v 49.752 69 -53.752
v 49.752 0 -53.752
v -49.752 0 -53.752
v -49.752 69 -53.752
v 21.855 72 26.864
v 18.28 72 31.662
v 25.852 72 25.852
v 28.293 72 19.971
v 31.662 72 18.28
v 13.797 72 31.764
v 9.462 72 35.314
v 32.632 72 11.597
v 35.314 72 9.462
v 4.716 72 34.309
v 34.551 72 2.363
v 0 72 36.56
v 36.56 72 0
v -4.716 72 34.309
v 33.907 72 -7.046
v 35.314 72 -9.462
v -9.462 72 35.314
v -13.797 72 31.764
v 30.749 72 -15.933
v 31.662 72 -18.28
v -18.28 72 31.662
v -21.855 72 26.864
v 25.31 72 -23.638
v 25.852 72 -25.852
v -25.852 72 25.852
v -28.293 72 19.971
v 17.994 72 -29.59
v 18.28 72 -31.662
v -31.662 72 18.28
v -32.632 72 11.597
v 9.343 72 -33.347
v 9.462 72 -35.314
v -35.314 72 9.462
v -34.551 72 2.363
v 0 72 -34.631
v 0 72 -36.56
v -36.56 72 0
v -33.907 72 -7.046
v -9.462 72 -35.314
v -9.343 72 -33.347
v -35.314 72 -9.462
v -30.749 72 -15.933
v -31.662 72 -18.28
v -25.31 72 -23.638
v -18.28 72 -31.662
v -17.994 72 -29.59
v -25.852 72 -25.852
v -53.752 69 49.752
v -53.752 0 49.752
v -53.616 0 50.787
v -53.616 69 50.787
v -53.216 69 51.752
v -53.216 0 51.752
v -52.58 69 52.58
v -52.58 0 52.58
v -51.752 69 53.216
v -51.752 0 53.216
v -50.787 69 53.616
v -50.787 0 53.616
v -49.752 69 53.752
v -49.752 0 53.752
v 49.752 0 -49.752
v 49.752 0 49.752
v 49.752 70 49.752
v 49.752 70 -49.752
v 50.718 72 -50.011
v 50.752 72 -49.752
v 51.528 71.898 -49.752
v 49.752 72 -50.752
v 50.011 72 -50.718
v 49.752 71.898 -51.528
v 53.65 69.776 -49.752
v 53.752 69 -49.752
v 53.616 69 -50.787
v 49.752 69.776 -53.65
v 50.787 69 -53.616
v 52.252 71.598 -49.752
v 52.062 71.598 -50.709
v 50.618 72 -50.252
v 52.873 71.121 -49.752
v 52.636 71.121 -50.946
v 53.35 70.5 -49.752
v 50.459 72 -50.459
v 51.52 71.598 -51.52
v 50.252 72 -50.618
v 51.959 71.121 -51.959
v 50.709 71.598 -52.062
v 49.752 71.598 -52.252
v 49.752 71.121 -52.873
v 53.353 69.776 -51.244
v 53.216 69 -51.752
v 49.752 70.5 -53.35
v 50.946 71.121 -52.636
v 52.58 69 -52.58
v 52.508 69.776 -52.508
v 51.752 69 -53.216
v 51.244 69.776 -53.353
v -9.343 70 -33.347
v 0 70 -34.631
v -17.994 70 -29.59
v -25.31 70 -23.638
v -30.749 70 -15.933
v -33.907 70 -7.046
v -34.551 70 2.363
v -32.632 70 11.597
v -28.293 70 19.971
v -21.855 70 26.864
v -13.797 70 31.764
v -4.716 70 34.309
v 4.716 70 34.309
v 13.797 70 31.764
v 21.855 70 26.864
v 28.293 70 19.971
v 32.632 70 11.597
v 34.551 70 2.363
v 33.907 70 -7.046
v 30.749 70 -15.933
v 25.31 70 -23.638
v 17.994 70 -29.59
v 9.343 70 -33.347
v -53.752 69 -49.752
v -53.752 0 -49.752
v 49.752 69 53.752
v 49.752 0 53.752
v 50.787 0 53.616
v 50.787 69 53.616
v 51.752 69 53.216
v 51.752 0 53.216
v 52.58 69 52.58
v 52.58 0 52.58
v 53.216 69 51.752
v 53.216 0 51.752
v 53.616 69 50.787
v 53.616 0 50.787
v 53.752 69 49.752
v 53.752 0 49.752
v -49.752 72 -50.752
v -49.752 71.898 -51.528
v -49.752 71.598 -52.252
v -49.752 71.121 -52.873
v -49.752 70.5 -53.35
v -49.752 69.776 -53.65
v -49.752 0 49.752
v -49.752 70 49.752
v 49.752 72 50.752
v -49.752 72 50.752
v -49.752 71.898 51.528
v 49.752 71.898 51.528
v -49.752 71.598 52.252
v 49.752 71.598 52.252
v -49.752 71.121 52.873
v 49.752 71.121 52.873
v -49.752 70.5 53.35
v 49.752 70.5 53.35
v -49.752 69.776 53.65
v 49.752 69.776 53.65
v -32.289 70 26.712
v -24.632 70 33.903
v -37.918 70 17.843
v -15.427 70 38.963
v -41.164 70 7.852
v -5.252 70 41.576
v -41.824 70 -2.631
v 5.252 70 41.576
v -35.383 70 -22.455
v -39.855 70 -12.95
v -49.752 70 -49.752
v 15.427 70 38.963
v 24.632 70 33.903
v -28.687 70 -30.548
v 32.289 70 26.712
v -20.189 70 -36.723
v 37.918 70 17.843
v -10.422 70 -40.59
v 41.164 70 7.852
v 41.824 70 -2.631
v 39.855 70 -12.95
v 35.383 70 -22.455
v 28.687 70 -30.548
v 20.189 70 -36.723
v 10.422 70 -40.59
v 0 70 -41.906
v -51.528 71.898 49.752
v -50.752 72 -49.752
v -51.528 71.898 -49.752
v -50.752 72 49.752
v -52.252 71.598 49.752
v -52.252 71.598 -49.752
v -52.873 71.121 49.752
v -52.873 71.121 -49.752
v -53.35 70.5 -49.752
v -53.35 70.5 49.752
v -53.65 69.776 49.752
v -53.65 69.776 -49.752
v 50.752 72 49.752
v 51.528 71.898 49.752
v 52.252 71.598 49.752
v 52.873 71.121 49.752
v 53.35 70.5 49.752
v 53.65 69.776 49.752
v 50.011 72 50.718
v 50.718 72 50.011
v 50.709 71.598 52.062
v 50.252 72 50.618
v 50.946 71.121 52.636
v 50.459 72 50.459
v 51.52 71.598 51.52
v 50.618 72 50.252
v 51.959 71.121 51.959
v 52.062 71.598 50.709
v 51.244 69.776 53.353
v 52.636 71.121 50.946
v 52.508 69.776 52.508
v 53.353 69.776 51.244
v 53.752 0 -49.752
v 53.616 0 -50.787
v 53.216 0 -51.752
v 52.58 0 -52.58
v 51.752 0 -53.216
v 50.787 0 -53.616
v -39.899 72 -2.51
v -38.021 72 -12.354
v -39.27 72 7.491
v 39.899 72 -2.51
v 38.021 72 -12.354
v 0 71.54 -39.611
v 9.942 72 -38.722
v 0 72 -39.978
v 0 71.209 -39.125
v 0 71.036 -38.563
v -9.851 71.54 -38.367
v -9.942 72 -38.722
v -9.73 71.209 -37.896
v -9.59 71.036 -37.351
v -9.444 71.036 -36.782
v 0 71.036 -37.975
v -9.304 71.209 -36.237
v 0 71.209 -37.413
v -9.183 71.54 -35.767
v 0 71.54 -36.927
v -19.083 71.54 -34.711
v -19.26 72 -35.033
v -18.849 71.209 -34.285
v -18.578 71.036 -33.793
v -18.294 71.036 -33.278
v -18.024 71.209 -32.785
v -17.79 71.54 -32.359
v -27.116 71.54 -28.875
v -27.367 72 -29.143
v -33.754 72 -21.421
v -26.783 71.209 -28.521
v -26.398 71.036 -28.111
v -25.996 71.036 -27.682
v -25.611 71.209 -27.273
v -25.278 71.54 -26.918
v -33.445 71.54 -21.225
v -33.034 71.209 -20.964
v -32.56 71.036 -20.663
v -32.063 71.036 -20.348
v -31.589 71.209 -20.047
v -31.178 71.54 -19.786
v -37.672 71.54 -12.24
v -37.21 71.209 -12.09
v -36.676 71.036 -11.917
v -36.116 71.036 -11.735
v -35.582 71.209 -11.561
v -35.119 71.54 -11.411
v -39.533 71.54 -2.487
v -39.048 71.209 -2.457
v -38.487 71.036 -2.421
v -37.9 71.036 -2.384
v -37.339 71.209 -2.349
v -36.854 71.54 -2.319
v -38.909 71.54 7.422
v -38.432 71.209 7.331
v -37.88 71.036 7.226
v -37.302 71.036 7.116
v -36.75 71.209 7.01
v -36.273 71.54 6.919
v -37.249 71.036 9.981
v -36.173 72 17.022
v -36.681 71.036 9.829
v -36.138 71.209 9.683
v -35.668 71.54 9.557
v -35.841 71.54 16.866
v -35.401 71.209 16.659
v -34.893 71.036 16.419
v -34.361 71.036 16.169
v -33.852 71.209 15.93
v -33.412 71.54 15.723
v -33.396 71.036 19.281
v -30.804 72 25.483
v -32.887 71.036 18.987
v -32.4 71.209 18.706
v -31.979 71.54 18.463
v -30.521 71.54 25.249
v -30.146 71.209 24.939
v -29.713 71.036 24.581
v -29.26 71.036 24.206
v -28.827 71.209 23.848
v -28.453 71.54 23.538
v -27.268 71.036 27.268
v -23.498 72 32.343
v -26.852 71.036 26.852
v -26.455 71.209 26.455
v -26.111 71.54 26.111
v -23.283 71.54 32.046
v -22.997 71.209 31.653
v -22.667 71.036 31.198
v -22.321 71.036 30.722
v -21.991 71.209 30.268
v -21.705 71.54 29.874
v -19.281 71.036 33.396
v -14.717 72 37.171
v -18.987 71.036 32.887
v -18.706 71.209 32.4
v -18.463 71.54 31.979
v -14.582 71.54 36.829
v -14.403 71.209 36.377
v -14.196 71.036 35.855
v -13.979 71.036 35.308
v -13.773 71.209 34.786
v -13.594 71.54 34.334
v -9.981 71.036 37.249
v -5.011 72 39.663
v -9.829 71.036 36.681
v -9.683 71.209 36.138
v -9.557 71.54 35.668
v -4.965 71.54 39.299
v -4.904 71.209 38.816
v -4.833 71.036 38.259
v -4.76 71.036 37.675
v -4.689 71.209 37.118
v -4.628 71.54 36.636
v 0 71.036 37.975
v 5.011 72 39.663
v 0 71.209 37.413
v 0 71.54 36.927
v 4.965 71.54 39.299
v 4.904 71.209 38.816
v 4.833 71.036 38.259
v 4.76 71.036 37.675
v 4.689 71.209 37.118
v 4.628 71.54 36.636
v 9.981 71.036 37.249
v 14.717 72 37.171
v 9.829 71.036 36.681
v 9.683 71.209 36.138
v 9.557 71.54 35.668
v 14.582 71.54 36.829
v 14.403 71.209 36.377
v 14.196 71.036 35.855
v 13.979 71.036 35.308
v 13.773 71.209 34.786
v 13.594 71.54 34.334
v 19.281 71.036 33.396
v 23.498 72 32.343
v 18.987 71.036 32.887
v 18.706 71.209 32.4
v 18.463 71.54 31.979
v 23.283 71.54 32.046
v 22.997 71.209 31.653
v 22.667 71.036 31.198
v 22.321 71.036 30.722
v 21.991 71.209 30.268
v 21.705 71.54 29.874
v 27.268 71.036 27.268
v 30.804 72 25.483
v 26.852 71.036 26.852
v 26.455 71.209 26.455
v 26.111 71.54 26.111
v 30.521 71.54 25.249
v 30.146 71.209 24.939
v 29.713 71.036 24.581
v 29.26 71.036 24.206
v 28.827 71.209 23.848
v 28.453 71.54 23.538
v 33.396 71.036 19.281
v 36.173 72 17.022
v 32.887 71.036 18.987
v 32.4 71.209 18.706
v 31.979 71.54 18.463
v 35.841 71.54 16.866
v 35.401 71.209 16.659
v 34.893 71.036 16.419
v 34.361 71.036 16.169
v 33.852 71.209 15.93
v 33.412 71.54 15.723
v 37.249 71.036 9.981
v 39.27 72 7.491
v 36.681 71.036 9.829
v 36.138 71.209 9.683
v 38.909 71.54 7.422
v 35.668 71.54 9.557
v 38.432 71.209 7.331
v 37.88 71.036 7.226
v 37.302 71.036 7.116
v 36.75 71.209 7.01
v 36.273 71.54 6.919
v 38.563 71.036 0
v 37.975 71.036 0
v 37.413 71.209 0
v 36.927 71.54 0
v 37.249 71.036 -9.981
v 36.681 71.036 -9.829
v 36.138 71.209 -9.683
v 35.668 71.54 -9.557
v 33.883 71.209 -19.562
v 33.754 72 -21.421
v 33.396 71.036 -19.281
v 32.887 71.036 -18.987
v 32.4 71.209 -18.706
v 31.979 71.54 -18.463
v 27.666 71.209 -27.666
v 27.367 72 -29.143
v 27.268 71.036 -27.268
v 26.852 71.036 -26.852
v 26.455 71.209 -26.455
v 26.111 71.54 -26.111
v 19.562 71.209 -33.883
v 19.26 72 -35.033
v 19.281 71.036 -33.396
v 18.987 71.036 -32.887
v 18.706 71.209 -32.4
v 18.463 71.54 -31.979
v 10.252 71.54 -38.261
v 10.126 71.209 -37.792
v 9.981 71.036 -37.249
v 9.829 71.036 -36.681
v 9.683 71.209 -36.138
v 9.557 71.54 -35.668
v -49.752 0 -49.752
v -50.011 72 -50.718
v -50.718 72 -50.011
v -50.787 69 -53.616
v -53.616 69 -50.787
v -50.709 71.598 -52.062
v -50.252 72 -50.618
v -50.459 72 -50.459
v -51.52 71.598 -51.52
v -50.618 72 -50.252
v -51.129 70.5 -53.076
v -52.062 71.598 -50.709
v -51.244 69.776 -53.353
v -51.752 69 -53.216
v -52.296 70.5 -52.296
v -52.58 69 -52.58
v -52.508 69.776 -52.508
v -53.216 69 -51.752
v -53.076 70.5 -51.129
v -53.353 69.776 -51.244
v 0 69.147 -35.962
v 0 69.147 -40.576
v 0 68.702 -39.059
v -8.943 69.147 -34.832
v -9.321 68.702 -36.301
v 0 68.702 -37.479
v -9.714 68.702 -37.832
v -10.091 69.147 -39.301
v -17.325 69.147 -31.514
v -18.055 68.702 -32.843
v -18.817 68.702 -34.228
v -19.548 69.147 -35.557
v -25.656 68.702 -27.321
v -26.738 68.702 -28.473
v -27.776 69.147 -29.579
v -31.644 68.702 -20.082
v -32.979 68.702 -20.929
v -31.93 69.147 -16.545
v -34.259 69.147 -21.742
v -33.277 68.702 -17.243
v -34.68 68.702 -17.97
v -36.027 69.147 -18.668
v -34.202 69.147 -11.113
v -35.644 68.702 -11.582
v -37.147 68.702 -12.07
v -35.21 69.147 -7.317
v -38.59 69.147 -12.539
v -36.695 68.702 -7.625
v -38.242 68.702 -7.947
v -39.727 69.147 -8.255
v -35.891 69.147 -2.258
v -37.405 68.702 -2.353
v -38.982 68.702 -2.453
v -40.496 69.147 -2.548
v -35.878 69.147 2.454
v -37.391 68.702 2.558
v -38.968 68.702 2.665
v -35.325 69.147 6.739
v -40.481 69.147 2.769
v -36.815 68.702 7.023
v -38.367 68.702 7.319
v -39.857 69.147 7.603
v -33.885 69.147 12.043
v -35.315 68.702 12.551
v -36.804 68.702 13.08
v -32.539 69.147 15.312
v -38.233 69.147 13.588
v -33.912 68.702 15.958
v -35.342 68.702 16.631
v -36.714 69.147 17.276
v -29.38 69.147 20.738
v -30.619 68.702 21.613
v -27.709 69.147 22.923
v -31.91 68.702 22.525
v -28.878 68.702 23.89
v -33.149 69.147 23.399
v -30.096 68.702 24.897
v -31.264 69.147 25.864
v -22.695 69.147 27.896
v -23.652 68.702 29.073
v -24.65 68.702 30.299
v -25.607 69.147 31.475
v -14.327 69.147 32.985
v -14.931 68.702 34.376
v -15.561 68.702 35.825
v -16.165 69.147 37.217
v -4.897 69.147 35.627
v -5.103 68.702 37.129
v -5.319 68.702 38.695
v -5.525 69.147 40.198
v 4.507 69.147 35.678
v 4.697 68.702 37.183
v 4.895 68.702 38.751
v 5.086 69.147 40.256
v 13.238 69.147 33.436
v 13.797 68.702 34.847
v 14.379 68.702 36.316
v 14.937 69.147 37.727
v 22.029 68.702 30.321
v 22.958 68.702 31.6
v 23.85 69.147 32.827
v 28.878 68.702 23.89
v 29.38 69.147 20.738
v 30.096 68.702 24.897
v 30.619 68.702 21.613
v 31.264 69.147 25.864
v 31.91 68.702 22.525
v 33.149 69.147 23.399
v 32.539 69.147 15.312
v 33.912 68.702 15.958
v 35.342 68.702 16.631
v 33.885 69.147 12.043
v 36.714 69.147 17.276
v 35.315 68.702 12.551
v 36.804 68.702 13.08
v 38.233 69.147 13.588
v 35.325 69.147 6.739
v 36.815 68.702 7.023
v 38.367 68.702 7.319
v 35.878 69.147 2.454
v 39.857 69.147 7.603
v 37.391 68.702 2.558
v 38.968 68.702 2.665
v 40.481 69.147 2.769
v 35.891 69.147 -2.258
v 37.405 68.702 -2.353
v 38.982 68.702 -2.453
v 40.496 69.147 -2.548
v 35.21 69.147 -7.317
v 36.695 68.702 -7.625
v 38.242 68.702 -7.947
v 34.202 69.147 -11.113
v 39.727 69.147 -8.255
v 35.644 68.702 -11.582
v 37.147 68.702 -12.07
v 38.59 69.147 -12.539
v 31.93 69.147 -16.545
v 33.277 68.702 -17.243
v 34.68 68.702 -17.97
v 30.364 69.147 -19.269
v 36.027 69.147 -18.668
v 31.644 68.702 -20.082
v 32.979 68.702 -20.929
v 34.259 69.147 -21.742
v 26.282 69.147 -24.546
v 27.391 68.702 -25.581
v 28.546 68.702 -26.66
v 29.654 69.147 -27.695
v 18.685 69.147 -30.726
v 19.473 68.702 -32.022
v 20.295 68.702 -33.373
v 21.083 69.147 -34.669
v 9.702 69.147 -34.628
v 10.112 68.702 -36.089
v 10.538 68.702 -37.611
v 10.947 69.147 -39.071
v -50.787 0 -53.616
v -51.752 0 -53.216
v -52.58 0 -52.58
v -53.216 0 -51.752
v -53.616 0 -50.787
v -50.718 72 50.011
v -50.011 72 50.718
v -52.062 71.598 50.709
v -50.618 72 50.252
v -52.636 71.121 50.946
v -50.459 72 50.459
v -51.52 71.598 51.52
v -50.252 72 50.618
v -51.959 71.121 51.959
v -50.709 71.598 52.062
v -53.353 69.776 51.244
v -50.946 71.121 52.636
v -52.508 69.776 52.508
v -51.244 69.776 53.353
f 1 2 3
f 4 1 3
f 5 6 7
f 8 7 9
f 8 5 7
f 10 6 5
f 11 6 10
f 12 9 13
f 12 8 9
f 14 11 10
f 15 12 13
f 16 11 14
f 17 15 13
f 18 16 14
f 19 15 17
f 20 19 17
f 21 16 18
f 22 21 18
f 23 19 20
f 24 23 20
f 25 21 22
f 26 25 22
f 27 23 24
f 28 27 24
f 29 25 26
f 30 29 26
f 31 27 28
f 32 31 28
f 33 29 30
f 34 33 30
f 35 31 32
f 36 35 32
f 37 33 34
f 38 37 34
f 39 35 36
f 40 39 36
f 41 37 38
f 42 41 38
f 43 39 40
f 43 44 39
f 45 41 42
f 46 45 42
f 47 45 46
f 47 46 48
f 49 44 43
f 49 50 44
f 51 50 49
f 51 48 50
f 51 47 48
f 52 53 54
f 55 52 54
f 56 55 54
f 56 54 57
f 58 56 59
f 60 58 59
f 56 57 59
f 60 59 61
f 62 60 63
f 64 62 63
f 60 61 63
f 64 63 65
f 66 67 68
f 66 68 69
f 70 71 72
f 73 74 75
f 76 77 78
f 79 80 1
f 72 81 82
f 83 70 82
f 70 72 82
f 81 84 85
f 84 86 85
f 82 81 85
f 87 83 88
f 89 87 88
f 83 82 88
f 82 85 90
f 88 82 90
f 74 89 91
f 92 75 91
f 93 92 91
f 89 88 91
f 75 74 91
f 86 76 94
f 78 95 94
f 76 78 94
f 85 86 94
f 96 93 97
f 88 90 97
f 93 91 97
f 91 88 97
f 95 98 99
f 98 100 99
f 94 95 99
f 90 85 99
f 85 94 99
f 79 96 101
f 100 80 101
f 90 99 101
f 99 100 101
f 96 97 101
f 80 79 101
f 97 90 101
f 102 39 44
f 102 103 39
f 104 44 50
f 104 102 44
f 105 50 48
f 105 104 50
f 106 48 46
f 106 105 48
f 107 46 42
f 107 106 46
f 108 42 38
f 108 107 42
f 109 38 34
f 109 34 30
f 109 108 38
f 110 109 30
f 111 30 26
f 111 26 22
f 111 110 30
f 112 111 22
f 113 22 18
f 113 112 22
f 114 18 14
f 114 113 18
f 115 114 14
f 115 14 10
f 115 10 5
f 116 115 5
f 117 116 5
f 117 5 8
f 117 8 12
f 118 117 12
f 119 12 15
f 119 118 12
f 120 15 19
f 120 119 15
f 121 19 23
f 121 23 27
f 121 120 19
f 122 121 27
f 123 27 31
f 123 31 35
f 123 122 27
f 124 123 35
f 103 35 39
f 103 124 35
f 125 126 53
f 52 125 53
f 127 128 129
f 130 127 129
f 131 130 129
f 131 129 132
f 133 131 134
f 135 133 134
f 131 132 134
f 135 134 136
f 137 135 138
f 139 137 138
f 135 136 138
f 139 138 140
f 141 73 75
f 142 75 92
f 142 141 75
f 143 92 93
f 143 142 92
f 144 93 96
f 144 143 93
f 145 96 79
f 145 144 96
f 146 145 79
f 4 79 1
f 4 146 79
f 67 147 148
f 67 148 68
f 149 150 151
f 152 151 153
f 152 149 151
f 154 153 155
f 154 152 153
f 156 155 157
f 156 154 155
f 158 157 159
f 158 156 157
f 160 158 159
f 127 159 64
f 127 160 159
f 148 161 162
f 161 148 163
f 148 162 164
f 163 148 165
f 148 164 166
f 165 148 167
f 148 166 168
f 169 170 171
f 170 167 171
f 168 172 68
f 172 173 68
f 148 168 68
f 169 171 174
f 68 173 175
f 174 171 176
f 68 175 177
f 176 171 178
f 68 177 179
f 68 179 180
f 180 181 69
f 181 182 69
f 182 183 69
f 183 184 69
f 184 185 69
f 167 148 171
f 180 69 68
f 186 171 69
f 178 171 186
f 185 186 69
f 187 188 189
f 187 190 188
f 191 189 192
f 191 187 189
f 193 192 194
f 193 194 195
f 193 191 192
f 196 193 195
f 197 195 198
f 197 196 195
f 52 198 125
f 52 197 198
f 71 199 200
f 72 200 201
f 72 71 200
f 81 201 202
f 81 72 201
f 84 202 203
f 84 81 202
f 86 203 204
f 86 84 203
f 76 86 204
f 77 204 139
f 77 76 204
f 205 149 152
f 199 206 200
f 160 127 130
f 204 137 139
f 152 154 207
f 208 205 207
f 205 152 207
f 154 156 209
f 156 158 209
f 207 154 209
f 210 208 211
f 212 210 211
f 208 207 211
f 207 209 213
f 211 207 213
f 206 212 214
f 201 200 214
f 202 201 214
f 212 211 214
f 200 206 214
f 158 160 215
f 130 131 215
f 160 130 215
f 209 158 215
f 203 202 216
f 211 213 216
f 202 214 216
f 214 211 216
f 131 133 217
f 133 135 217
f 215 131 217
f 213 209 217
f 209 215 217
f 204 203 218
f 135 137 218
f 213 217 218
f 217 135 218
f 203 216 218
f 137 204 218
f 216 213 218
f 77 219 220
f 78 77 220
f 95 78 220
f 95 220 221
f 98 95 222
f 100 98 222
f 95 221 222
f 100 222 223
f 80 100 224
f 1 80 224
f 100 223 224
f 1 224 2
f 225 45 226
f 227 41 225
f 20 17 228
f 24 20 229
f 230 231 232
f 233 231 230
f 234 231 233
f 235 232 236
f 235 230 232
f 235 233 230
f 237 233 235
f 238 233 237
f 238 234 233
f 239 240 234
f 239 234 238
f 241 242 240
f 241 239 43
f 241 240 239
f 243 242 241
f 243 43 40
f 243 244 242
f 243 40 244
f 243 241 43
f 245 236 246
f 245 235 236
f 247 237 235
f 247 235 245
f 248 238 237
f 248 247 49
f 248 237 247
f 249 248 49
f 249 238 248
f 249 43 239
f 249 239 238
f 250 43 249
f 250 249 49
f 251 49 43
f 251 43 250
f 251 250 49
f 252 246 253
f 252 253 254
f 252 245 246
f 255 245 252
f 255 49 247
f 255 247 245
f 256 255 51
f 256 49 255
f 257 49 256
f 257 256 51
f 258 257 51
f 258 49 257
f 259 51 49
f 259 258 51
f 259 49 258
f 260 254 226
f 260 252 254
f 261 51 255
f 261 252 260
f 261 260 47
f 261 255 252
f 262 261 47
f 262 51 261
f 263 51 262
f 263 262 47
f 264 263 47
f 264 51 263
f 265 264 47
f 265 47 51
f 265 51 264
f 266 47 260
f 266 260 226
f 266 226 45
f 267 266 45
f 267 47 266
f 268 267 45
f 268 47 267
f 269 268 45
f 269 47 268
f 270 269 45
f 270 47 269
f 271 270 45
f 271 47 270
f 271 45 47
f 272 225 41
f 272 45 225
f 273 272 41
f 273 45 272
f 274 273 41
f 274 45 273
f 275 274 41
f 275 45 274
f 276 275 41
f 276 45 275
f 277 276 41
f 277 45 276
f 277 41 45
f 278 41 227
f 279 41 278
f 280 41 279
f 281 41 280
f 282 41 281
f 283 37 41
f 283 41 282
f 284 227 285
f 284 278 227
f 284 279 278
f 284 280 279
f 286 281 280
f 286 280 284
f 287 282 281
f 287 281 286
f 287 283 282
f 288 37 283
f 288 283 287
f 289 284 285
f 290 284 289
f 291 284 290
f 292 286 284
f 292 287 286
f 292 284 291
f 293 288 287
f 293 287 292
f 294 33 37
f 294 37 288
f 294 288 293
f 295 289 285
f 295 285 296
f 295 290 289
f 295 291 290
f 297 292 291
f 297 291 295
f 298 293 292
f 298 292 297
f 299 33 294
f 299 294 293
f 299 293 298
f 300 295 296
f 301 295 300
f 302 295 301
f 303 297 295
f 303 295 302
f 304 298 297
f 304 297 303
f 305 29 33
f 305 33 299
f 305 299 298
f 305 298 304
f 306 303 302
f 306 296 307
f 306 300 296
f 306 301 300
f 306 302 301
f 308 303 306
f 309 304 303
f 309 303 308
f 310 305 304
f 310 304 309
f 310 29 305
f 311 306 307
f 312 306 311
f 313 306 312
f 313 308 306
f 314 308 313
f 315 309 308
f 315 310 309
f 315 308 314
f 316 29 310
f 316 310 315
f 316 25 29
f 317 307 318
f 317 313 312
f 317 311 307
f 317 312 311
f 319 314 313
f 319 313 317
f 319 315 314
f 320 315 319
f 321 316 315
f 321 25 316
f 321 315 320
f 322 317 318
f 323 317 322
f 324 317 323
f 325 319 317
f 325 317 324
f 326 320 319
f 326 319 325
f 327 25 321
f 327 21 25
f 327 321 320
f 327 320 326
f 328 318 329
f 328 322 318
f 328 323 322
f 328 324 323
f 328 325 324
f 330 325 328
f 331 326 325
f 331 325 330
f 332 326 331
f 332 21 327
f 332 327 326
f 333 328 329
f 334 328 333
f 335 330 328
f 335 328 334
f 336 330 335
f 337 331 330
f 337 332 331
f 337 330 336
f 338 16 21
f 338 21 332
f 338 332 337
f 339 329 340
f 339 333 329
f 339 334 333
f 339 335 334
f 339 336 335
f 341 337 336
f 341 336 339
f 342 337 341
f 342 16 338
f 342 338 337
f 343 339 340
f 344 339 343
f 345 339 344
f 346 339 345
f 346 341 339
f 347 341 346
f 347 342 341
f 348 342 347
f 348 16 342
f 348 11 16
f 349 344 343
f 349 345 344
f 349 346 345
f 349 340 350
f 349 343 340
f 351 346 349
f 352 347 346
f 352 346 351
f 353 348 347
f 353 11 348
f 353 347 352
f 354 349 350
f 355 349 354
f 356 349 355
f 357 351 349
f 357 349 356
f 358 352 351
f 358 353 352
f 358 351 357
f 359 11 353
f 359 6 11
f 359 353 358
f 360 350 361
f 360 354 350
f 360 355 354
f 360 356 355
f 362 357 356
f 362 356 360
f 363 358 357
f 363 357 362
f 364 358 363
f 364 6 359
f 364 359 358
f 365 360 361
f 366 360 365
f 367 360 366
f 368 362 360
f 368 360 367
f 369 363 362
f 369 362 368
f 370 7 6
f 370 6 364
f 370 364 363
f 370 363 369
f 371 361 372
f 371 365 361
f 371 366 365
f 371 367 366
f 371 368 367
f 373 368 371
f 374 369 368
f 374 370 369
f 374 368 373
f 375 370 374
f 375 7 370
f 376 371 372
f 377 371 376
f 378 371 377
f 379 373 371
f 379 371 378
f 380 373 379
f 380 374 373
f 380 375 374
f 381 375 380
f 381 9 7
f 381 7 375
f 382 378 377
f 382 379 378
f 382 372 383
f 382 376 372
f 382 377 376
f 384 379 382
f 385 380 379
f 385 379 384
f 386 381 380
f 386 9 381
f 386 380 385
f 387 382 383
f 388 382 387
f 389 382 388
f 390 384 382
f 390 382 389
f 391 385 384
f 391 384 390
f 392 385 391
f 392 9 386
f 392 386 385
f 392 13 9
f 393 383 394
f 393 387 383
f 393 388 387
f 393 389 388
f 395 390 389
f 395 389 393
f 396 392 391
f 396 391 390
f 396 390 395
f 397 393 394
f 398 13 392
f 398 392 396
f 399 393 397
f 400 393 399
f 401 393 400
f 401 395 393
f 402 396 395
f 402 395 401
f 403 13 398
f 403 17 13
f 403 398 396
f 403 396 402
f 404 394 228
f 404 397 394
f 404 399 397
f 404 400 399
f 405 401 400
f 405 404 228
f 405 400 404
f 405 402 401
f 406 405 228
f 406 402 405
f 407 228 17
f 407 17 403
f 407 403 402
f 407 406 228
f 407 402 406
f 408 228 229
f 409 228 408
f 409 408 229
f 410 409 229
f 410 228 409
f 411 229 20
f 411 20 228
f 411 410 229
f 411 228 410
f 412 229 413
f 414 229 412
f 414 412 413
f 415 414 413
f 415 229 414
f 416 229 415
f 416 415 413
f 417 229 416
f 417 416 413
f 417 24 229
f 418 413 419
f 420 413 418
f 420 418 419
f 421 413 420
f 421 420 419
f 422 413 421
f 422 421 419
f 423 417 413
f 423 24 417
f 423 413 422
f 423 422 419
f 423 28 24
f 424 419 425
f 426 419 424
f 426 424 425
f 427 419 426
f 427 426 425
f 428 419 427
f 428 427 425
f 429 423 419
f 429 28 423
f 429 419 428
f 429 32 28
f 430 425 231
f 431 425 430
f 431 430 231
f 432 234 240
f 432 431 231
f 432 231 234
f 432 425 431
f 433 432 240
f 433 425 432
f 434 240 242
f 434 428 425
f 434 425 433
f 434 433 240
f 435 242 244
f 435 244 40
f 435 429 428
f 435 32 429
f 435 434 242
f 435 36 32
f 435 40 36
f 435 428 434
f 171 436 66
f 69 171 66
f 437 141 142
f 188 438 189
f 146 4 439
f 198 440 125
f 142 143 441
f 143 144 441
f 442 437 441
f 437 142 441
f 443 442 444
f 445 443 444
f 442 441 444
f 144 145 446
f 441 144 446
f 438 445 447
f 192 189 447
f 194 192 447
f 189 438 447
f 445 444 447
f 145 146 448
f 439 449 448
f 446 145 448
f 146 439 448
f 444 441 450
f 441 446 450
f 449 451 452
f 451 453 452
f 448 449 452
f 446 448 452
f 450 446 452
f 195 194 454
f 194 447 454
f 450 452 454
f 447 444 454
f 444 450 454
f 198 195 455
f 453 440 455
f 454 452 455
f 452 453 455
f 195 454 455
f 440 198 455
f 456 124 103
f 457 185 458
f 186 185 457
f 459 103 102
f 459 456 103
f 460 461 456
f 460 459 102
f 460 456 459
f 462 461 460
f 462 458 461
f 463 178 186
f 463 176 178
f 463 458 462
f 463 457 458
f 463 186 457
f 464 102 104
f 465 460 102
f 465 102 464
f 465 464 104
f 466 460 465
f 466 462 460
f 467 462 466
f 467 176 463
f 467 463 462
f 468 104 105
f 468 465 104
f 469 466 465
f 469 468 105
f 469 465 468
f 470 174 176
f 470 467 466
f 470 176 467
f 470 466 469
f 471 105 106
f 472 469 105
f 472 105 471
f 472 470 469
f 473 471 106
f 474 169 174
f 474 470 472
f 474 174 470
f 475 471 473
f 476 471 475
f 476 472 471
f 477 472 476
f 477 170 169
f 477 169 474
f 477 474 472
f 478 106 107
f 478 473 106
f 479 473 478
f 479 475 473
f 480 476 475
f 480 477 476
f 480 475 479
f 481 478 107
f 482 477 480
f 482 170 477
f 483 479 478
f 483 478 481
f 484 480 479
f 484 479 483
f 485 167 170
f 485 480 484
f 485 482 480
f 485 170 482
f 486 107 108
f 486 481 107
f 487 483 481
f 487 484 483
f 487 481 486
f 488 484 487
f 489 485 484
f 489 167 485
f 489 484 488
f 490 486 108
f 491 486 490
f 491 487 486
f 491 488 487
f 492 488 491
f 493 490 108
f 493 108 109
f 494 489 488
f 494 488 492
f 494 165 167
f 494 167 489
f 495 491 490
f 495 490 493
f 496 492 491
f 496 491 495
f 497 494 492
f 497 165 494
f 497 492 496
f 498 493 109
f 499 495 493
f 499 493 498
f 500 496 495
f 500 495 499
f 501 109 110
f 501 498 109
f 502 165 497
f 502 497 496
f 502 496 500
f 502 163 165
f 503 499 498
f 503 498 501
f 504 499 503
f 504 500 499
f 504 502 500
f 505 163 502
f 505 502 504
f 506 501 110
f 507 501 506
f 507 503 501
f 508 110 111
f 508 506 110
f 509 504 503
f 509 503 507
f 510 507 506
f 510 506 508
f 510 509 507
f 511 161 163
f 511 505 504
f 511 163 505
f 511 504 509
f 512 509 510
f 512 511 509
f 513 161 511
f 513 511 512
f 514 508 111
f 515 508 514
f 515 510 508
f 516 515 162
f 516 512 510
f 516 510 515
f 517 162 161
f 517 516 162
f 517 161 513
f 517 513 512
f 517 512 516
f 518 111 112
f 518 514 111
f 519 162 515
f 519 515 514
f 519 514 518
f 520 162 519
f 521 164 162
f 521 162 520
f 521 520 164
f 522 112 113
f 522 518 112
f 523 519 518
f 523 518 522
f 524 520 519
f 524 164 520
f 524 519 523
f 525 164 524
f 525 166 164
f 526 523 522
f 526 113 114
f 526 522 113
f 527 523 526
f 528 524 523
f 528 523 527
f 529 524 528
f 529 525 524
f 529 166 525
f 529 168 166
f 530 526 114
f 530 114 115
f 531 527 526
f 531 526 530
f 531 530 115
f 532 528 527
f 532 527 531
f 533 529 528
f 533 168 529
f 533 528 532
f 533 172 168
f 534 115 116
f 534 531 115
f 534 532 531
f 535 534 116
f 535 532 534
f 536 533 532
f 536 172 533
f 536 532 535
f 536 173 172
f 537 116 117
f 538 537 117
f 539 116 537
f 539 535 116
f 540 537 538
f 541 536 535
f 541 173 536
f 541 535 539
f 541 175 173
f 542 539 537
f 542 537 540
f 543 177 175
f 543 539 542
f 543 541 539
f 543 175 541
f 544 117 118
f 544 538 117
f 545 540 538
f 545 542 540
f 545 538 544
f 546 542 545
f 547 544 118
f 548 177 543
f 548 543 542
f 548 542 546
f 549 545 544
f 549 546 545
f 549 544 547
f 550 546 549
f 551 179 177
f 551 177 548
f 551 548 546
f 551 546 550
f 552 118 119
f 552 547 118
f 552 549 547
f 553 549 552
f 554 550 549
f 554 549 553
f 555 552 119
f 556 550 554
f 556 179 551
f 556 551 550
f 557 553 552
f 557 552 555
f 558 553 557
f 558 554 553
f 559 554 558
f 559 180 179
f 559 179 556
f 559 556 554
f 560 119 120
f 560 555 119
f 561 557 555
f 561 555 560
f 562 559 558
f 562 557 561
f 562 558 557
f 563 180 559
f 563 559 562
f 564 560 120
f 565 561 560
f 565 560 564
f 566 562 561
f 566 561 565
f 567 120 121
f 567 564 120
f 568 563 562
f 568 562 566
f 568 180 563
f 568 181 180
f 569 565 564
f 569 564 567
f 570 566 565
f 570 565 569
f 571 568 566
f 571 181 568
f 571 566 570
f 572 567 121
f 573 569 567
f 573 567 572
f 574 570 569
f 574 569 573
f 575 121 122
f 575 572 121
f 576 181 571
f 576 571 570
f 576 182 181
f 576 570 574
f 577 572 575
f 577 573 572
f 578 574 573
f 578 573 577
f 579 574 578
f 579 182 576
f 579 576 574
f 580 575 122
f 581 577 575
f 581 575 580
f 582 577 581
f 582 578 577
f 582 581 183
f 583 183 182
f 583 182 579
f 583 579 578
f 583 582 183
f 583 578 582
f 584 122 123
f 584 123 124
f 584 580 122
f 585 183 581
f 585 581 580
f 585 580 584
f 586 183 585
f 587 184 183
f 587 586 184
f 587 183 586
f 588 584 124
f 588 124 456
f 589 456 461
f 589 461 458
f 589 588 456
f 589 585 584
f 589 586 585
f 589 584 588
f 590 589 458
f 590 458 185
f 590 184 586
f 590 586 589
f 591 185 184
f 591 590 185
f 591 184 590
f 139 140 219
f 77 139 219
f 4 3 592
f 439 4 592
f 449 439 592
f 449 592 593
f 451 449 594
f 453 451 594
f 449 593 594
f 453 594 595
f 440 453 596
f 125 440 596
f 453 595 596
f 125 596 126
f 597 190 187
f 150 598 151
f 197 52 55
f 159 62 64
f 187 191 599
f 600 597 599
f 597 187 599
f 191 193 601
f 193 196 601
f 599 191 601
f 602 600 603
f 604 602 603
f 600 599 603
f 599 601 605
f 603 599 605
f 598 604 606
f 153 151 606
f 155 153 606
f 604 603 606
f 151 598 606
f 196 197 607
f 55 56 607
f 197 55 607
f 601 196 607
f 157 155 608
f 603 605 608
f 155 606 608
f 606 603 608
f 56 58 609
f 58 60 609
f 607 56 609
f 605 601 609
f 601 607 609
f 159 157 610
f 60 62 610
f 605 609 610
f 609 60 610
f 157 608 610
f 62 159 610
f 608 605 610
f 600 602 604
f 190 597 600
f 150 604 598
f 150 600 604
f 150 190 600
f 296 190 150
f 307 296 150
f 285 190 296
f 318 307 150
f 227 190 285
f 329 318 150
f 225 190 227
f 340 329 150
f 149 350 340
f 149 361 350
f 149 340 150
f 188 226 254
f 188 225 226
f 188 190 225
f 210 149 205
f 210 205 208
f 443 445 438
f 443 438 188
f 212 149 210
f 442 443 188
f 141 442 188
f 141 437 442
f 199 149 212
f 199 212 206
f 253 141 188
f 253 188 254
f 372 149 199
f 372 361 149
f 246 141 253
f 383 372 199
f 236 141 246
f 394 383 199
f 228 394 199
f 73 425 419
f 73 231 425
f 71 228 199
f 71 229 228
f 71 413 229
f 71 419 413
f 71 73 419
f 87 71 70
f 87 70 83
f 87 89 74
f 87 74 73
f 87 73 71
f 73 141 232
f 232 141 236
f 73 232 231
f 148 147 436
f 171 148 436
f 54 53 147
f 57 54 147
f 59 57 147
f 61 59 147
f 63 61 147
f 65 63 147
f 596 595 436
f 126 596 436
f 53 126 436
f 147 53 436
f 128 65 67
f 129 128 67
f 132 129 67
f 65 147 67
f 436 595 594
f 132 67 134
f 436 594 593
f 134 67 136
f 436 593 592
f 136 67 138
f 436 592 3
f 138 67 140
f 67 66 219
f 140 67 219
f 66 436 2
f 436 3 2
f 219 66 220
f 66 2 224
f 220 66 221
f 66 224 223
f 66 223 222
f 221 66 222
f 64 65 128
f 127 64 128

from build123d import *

# Parameters (mm, degrees)
SKETCH1_W           = 99.503865414
SKETCH1_H           = 99.503865414
BOSS_EXTRUDE1_DEPTH = 70
SKETCH2_R           = 41.055084084
BOSS_EXTRUDE2_DEPTH = 2
FILLET1_R           = 3


with BuildPart() as part:
    # Sketch1 → Boss-Extrude1 (new body)
    with BuildSketch(Plane(origin=(0, 0, 0), x_dir=(1, 0, 0), z_dir=(0, 1, 0))):
        with BuildLine():
            Line((-49.751932707, -53.751932707), (49.751932707, -53.751932707))
            ThreePointArc((49.751932707, -53.751932707), (52.580359832, -52.580359832), (53.751932707, -49.751932707))
            Line((53.751932707, -49.751932707), (53.751932707, 49.751932707))
            ThreePointArc((53.751932707, 49.751932707), (52.580359832, 52.580359832), (49.751932707, 53.751932707))
            Line((49.751932707, 53.751932707), (-49.751932707, 53.751932707))
            ThreePointArc((-49.751932707, 53.751932707), (-52.580359832, 52.580359832), (-53.751932707, 49.751932707))
            Line((-53.751932707, 49.751932707), (-53.751932707, -49.751932707))
            ThreePointArc((-53.751932707, -49.751932707), (-52.580359832, -52.580359832), (-49.751932707, -53.751932707))
        make_face()
        Rectangle(SKETCH1_W, SKETCH1_H, mode=Mode.SUBTRACT)
    extrude(amount=BOSS_EXTRUDE1_DEPTH)

    # Sketch2 → Boss-Extrude2 (add)
    with BuildSketch(Plane(origin=(0, 70, 0), x_dir=(1, 0, 0), z_dir=(0, 1, 0))):
        with BuildLine():
            Line((-49.751932707, -53.751932707), (49.751932707, -53.751932707))
            ThreePointArc((49.751932707, -53.751932707), (52.580359832, -52.580359832), (53.751932707, -49.751932707))
            Line((53.751932707, -49.751932707), (53.751932707, 49.751932707))
            ThreePointArc((53.751932707, 49.751932707), (52.580359832, 52.580359832), (49.751932707, 53.751932707))
            Line((49.751932707, 53.751932707), (-49.751932707, 53.751932707))
            ThreePointArc((-49.751932707, 53.751932707), (-52.580359832, 52.580359832), (-53.751932707, 49.751932707))
            Line((-53.751932707, 49.751932707), (-53.751932707, -49.751932707))
            ThreePointArc((-53.751932707, -49.751932707), (-52.580359832, -52.580359832), (-49.751932707, -53.751932707))
        make_face()
        Circle(SKETCH2_R, mode=Mode.SUBTRACT)
    extrude(amount=BOSS_EXTRUDE2_DEPTH)

    # Fillet1
    fillet1_edges = [part.edges().sort_by_distance(p)[0] for p in [
        (52.580359832, 72, 52.580359832),
        (0, 72, 53.751932707),
        (-52.580359832, 72, 52.580359832),
        (-53.751932707, 72, 0),
        (-52.580359832, 72, -52.580359832),
        (0, 72, -53.751932707),
        (52.580359832, 72, -52.580359832),
        (53.751932707, 72, 0),
    ]]
    fillet(fillet1_edges, radius=FILLET1_R)

    # Sketch6 → Revolve1 (revolve)
    with BuildSketch(Plane(origin=(0, 0, 0), x_dir=(0, 0, -1), z_dir=(1, 0, 0))):
        with BuildLine():
            Line((-41.906282127, 70), (-41.906282127, 72))
            Line((-41.906282127, 72), (-39.977926792, 72))
            ThreePointArc((-39.977926792, 72), (-38.268844469, 71.01399696), (-36.559762147, 72))
            Line((-36.559762147, 72), (-34.631406812, 72))
            Line((-34.631406812, 72), (-34.631406812, 70))
            ThreePointArc((-34.631406812, 70), (-38.268844469, 68.645456934), (-41.906282127, 70))
        make_face()
    revolve(axis=Axis((0, 0, 0), (0, 1, 0)))


solid = part.part
